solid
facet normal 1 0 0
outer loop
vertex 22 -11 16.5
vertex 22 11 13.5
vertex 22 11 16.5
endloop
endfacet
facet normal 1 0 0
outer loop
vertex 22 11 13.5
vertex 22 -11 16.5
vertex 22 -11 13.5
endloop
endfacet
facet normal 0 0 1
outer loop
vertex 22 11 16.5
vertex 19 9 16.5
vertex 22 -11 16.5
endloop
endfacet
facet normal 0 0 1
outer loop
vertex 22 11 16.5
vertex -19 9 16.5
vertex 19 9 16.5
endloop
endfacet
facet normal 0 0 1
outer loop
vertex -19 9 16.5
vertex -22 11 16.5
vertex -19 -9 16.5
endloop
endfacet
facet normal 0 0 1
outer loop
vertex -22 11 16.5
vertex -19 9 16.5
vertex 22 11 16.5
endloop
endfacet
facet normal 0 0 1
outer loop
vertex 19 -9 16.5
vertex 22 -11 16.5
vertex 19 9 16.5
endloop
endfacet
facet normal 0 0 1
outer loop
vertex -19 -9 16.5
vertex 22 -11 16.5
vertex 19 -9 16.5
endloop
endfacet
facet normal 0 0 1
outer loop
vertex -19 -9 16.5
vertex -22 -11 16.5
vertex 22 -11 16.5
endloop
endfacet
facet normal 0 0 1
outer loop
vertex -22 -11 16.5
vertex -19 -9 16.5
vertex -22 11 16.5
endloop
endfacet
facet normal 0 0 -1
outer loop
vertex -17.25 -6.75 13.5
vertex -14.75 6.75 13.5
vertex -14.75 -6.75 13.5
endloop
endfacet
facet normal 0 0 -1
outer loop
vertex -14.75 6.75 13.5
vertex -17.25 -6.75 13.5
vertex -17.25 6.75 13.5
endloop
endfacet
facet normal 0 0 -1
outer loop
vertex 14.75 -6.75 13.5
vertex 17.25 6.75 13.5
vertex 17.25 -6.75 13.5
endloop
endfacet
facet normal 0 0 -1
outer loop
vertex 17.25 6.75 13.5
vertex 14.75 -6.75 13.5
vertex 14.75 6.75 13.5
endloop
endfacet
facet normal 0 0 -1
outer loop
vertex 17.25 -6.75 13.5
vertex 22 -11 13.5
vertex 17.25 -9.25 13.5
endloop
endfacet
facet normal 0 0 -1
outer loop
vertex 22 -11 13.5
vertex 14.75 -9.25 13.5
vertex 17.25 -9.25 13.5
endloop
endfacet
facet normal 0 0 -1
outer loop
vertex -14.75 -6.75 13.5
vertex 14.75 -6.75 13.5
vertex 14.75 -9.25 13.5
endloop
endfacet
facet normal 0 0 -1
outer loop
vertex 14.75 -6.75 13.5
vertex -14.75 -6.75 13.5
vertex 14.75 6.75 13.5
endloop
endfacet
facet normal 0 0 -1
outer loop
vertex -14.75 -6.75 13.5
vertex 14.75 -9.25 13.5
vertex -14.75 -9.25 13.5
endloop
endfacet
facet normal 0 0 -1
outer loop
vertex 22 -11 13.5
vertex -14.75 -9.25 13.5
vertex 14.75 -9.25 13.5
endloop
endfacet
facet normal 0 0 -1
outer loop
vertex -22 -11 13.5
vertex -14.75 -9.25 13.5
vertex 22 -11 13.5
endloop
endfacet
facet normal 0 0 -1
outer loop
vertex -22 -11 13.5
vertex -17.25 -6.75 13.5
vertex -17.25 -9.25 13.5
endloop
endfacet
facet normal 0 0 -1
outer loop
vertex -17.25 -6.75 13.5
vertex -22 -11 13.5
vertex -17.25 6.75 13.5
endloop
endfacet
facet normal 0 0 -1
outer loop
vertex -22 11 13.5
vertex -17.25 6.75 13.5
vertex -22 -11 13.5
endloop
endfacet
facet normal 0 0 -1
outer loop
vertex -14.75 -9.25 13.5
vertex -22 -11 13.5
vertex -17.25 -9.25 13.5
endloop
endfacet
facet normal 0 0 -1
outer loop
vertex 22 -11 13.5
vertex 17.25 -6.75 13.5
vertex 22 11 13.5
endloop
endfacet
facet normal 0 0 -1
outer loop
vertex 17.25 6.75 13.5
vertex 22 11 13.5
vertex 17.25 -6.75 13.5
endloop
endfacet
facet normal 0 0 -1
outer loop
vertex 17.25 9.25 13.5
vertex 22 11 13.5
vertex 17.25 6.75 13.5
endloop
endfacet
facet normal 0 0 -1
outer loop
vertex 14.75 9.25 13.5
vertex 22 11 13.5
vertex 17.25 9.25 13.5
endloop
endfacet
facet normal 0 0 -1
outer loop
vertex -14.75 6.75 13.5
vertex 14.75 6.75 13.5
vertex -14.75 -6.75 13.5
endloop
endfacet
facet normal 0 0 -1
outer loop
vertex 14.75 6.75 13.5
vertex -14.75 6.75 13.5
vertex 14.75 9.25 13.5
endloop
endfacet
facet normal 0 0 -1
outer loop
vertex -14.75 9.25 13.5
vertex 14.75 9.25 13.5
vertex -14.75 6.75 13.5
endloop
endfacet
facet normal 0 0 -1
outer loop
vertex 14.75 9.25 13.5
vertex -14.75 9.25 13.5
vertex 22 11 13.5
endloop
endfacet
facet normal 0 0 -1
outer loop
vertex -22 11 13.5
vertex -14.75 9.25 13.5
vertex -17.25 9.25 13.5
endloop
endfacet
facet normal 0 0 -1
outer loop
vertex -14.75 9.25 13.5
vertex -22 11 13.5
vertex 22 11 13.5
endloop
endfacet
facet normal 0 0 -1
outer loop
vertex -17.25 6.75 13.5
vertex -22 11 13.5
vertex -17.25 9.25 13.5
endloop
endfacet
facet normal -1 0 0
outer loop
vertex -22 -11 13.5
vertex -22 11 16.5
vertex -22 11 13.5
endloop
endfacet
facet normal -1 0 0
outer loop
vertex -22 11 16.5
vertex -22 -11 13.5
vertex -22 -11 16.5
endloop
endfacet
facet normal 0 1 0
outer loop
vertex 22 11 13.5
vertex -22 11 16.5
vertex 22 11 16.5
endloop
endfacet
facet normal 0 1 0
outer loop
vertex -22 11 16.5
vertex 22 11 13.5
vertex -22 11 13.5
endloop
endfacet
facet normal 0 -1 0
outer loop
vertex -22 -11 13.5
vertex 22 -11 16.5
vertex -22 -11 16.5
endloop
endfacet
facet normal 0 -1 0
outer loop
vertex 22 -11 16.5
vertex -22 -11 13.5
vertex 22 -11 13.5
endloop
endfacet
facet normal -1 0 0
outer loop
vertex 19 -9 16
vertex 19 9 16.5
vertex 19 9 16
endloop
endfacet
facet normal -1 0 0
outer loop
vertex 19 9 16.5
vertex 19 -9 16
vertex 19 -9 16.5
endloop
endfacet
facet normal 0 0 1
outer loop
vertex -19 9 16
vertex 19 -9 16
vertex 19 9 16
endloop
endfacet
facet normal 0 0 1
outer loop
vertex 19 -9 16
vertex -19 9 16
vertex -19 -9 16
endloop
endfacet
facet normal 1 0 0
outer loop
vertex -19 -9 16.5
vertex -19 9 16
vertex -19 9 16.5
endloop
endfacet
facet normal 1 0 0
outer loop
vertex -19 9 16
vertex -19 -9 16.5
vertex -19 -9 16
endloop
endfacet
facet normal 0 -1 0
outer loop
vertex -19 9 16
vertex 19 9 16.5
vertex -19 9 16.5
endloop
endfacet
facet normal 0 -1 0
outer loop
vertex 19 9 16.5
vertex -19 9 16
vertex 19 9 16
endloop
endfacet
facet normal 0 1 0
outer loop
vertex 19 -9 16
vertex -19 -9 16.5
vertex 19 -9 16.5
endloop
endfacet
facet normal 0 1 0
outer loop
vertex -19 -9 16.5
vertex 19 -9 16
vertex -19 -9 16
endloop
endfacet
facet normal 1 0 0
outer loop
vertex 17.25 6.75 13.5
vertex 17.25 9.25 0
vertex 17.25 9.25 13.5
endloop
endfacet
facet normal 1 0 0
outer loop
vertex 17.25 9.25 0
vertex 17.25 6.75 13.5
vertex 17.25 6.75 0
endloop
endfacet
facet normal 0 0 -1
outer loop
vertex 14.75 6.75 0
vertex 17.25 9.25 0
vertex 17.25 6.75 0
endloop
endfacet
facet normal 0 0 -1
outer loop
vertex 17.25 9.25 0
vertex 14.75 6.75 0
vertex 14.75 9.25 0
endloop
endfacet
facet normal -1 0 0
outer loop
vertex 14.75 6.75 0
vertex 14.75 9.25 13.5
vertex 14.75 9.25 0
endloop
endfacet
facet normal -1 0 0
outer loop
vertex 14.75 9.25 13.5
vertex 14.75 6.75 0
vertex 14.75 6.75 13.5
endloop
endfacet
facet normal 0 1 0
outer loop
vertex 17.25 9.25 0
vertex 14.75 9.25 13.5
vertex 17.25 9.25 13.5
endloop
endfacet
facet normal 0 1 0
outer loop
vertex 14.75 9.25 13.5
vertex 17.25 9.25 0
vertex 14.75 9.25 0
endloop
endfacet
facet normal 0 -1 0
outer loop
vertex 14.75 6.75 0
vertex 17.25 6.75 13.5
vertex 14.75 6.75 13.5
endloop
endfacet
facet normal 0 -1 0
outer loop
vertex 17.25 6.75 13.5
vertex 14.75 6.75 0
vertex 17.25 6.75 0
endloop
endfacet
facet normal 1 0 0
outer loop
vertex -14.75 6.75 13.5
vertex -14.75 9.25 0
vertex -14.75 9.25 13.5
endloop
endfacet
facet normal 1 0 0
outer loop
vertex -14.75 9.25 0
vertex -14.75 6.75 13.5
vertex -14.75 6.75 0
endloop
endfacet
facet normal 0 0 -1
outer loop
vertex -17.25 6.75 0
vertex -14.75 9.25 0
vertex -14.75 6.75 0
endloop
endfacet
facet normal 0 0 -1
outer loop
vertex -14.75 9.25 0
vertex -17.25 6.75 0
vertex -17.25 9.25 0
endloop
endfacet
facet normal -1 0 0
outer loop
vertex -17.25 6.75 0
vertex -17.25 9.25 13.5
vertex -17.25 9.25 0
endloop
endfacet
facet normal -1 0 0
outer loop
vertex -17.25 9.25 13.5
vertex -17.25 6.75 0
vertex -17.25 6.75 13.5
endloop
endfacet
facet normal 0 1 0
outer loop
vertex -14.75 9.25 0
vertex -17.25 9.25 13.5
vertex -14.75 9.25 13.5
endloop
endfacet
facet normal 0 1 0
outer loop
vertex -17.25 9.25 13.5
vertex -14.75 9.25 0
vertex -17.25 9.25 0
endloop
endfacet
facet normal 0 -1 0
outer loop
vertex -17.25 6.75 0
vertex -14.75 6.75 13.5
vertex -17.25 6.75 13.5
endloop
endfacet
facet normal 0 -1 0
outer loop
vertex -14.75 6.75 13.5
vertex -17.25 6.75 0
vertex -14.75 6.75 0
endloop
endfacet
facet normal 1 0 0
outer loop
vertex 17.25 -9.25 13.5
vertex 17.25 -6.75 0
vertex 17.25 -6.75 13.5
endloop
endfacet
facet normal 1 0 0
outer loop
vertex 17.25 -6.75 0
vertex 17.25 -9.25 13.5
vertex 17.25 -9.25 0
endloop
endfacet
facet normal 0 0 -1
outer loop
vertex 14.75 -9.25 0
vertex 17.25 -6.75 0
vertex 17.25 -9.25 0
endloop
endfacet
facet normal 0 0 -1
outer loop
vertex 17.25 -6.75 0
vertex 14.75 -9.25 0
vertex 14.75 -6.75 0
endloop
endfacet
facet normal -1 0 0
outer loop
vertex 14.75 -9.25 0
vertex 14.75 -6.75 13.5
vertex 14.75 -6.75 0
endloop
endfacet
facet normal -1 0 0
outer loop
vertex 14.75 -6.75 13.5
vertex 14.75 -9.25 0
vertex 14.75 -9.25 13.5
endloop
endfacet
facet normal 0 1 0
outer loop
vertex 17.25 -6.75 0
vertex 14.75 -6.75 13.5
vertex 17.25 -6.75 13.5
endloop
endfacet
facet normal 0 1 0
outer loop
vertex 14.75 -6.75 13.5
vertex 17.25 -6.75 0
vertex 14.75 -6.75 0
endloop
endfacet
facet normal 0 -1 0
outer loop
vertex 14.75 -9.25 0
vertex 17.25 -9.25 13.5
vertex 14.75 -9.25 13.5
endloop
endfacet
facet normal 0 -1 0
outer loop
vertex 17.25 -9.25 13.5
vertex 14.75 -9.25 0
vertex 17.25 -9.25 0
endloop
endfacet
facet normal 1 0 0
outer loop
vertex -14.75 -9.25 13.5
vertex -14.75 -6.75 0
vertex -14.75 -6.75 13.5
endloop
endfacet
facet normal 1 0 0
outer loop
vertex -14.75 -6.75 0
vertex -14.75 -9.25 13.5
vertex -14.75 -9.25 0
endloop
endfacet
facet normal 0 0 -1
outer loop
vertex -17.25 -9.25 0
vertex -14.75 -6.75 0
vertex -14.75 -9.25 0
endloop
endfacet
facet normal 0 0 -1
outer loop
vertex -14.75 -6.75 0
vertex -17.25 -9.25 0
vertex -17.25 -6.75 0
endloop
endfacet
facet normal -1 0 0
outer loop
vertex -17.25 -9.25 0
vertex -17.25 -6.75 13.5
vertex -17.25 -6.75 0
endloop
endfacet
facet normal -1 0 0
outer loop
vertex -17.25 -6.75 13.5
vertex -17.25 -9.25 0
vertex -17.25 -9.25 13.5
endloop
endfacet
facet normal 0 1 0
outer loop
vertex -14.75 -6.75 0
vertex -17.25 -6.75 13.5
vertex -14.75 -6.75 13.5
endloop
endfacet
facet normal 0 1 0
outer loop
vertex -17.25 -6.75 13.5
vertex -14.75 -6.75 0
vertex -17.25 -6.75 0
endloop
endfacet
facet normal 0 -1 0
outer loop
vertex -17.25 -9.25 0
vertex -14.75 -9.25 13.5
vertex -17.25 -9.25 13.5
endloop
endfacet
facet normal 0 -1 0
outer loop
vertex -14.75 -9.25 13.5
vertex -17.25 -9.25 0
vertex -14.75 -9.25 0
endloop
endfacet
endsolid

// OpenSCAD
chairHeight = 15;

union() {
    translate([16, 8, chairHeight / 2]) cube([2.5, 2.5, 15], center=true);
    translate([-16, 8, chairHeight / 2]) cube([2.5, 2.5, 15], center=true);
    translate([16, -8, chairHeight / 2]) cube([2.5, 2.5, 15], center=true);
    translate([-16, -8, chairHeight / 2]) cube([2.5, 2.5, 15], center=true);

    difference() {
        translate([0, 0, chairHeight]) cube([44, 22, 3], center=true);
        translate([0, 0, chairHeight+2]) cube([38, 18, 2], center=true);
    }
}
